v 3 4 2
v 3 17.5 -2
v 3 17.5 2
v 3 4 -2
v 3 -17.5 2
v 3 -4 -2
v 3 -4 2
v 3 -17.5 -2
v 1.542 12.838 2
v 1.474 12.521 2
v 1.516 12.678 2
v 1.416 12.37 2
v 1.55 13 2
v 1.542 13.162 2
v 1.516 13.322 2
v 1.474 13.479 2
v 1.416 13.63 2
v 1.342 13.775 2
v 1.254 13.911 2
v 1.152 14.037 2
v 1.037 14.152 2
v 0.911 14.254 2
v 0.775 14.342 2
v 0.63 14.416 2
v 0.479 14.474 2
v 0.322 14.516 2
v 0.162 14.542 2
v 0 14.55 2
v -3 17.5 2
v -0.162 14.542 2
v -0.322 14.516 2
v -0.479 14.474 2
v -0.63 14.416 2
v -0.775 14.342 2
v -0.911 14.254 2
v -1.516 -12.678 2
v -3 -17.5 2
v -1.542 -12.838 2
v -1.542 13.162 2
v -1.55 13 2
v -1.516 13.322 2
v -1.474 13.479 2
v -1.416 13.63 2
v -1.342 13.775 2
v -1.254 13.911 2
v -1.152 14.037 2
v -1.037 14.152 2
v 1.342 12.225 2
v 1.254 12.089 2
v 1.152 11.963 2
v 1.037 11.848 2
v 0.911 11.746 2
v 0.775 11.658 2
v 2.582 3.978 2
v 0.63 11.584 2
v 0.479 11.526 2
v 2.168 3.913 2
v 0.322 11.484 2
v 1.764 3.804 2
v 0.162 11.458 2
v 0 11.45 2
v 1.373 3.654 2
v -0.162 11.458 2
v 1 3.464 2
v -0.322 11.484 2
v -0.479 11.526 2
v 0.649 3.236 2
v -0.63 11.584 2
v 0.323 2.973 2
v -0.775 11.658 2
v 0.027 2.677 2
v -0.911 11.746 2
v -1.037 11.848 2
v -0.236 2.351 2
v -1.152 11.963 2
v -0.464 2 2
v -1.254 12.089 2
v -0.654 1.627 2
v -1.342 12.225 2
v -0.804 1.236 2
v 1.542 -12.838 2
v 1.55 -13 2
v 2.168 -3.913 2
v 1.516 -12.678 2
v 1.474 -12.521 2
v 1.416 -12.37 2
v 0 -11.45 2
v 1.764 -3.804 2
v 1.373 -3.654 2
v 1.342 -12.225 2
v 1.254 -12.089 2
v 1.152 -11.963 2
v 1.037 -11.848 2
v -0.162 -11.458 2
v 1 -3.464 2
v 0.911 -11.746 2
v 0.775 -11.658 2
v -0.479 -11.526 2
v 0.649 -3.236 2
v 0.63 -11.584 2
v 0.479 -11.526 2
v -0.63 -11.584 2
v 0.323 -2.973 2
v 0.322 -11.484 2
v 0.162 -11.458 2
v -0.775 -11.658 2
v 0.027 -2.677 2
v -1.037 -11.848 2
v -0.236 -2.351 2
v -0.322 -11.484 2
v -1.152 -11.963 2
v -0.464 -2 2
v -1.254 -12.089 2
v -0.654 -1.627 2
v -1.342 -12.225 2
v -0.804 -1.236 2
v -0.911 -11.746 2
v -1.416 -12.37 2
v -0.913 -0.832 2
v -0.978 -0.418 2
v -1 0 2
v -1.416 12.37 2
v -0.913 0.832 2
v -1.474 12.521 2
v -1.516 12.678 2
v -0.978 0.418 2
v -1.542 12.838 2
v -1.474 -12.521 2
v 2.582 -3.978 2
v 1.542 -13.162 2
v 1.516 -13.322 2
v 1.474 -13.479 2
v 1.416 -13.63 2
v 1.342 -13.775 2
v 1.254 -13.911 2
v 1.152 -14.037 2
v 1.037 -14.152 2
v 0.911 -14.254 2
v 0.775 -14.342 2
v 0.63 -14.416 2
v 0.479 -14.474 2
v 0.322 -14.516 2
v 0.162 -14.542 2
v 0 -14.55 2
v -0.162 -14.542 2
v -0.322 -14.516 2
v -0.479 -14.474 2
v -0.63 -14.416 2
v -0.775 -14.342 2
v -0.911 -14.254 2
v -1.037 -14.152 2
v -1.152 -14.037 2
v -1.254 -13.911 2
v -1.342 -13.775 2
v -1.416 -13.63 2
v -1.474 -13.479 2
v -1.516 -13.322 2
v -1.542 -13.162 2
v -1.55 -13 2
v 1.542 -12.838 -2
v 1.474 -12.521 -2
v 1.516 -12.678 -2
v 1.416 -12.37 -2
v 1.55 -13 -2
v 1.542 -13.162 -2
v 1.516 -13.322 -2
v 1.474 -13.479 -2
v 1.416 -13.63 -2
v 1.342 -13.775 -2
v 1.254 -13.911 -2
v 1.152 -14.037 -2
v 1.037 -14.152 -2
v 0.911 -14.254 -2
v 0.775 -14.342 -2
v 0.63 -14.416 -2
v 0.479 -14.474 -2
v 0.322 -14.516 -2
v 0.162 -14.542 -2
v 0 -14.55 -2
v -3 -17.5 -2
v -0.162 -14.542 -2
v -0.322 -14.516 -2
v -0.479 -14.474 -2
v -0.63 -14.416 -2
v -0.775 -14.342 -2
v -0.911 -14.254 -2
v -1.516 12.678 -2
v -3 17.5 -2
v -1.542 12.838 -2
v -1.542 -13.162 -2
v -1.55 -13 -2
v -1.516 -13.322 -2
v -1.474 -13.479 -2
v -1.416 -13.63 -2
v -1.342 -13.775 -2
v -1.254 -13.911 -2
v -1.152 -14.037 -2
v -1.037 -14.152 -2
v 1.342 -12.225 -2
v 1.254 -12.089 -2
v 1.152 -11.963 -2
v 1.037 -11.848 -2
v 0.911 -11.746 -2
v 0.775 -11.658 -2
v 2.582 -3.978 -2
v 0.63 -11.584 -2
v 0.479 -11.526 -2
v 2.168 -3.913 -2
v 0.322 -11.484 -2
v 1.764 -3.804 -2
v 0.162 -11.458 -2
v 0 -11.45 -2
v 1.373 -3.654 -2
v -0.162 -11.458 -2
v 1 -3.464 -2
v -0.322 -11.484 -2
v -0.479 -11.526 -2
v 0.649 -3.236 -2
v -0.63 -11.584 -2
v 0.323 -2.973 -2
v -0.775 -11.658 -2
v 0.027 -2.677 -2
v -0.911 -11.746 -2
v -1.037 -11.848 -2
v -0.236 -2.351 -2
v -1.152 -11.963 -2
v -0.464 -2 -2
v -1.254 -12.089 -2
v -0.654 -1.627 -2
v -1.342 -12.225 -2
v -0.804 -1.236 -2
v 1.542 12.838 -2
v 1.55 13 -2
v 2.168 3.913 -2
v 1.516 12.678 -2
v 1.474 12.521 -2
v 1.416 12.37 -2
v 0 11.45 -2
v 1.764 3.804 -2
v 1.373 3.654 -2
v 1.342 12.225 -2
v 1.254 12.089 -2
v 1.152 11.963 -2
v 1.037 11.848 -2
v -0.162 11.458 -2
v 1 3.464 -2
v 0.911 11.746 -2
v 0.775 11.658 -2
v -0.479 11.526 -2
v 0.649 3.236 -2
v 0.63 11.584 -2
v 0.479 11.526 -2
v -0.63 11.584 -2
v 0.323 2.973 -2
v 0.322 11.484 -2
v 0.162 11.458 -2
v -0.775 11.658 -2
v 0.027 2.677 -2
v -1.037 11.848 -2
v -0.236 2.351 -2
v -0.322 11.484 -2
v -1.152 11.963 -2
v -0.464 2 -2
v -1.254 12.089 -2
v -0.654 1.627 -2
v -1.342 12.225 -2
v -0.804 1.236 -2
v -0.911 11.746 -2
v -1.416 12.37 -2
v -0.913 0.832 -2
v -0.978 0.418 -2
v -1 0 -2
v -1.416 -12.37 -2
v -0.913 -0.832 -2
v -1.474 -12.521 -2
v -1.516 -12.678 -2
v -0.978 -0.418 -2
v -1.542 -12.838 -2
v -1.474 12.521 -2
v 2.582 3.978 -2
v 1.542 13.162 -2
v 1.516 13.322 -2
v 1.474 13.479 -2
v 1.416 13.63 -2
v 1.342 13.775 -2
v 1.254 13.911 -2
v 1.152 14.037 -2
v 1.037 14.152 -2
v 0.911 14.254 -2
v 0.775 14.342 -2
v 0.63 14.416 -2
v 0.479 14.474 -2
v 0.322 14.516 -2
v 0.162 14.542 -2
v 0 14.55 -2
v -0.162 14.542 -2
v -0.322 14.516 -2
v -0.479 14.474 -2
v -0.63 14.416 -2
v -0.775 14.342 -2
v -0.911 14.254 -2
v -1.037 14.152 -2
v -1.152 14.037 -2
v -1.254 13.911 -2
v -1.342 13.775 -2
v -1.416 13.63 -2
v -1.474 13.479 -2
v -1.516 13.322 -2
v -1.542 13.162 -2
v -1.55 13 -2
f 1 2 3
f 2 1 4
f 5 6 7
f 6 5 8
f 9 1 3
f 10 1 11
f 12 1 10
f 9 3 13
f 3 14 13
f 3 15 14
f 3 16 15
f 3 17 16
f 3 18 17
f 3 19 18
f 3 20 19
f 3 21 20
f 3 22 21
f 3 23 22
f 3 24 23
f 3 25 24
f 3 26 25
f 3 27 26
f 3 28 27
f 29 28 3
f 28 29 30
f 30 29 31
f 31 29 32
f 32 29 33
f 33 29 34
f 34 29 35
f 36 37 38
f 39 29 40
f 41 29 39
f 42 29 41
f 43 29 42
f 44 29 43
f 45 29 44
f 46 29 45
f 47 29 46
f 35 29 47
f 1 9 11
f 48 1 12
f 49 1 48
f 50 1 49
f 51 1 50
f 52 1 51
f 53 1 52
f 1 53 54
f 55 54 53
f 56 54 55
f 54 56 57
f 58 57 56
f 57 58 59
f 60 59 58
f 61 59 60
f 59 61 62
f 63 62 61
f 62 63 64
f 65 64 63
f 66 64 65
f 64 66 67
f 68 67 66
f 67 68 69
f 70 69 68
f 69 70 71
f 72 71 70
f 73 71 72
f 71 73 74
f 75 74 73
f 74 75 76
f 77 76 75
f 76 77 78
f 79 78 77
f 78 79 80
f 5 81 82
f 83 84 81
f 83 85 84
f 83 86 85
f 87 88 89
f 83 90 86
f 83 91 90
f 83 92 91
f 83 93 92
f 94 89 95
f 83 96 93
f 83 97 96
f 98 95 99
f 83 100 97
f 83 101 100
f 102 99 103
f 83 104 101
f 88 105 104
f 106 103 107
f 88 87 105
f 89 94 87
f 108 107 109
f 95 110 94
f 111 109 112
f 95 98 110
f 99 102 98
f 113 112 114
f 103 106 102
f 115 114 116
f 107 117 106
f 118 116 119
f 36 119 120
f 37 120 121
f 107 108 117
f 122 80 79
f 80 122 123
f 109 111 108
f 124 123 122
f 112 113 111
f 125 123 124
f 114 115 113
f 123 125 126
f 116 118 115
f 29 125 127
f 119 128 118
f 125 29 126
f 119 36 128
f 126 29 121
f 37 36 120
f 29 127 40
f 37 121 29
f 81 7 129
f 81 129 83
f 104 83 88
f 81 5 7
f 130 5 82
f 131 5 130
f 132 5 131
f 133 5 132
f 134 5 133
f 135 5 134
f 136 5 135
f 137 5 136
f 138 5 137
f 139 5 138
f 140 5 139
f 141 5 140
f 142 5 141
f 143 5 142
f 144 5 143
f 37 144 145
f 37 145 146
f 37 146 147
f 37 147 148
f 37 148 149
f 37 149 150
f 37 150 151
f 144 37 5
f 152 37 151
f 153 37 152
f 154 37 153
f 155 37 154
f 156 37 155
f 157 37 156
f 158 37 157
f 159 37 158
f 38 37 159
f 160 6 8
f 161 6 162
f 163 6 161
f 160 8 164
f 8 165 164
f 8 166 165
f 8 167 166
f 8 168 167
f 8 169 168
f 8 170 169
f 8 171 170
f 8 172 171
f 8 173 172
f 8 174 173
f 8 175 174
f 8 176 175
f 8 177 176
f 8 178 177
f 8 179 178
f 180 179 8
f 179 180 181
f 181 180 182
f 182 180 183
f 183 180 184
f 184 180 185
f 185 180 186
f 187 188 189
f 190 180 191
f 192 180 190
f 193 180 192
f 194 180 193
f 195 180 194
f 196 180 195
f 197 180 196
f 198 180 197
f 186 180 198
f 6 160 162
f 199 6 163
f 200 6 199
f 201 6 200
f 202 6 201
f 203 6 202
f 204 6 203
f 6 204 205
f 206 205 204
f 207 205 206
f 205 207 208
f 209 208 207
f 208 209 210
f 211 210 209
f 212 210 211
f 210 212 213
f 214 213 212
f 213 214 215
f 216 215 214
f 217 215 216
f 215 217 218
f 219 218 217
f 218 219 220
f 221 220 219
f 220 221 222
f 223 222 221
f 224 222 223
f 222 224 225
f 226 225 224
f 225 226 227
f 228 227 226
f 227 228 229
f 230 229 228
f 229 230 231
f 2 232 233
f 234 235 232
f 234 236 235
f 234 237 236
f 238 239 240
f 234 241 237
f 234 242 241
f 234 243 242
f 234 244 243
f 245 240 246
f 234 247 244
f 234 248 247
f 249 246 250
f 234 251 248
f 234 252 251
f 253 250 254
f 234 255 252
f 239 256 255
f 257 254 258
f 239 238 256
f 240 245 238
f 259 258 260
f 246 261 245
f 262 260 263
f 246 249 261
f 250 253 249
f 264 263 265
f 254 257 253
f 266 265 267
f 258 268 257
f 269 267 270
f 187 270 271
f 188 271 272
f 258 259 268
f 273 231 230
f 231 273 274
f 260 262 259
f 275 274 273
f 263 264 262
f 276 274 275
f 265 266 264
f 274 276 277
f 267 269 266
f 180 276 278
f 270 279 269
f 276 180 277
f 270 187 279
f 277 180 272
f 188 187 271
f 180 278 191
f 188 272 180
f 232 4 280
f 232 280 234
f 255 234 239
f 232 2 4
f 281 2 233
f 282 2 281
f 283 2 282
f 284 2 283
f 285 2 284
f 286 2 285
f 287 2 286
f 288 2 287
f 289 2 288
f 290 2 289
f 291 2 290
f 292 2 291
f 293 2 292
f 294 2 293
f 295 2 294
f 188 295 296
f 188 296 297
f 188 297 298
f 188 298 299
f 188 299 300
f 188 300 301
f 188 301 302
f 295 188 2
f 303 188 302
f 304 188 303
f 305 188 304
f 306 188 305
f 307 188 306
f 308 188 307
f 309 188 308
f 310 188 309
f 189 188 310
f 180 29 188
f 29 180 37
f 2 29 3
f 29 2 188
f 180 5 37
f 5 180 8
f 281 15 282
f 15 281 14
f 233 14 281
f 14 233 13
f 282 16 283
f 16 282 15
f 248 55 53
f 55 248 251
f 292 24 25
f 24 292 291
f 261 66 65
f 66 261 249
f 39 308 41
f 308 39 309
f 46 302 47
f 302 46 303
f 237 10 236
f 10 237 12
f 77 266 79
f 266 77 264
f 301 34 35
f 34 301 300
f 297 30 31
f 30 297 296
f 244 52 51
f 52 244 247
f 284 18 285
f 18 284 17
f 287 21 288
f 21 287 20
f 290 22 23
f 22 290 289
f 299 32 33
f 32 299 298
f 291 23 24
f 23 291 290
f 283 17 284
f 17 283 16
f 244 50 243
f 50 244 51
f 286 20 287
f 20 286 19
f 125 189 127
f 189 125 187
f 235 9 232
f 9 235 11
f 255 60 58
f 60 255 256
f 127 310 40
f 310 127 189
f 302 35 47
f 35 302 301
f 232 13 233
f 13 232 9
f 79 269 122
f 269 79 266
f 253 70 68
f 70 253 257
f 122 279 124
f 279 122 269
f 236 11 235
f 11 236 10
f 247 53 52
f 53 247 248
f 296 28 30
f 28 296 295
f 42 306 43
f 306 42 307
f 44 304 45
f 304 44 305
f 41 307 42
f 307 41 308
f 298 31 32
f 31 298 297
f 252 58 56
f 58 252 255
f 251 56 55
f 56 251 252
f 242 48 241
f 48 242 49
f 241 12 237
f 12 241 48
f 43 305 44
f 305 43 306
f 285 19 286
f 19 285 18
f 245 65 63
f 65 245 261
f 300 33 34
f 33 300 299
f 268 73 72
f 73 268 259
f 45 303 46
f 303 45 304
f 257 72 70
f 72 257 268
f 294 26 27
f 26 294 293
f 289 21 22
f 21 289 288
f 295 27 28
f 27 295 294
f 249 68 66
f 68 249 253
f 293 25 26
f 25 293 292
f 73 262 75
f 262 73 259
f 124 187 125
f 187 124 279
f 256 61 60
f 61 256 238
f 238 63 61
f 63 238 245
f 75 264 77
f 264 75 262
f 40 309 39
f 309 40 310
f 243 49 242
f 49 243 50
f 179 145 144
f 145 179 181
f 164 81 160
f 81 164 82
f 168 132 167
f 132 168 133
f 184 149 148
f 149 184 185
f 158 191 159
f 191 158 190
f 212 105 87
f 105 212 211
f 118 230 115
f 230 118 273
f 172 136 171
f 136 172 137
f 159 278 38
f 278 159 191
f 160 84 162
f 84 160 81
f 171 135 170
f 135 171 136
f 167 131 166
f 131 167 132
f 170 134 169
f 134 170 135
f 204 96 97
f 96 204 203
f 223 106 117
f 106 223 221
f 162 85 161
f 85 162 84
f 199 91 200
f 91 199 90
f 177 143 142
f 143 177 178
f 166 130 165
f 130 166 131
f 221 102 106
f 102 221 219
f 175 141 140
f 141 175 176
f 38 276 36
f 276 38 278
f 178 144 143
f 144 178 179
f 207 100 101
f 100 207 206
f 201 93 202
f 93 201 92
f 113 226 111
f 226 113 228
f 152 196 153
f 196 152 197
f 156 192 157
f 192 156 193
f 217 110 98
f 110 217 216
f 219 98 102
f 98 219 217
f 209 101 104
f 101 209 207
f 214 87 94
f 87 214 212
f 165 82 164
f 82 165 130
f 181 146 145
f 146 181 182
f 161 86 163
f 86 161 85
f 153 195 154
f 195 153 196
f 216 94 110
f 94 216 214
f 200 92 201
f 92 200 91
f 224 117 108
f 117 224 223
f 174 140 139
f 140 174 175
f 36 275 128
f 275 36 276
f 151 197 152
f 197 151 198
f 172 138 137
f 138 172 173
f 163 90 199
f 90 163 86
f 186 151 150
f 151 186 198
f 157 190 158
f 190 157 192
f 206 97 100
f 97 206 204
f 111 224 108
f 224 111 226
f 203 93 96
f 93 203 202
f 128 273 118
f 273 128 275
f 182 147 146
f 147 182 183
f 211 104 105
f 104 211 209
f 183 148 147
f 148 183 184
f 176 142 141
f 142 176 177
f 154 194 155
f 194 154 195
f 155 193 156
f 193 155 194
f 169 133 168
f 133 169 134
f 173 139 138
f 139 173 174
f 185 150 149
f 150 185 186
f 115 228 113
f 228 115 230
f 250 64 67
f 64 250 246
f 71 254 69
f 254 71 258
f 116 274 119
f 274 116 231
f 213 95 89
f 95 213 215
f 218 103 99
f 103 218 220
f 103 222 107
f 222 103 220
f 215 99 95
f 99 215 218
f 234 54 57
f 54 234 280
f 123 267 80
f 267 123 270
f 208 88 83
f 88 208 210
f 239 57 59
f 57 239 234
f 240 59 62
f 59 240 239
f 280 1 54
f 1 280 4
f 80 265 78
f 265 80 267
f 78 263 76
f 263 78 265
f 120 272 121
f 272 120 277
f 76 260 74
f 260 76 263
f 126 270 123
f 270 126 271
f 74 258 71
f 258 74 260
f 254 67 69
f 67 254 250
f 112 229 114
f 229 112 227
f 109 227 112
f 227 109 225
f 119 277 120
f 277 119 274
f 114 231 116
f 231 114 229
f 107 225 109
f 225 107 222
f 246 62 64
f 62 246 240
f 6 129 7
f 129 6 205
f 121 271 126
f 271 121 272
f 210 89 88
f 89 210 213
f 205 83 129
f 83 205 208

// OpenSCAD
// file: constants.scad
    /*Project constants*/
//width = ScrewHoleDist+(BaseDiam*2)+ WidthCompl
//
//Distance of the holes for mounting, affects the width(y-axis)
ScrewHoleDist = 31;

//Thickness of the plate
BaseThick = 8.0;

 
//Diameter of the hole in the middle on the stepper holder
MidHoleDiam = 23;

//Diameter of the screw hole
ScrewHoleDiam = 3.1;
    
//Diameter of the corner cylinders,affects the width of the body(y-axis)
BaseDiam = 3;

//Body width complement (y-axis)
WidthCompl = 10;
//Body length complement (x-axis)
LengthCompl = 10;

//Body length complement for the upper part (x-axis)
LengthDiffUp = 5;

//Body length complement for the moving part (x)
LengthDiffDown = 5;

W = ScrewHoleDist+(BaseDiam*2)+WidthCompl;
L = ScrewHoleDist+(BaseDiam*2)+LengthCompl;



//Diameter of the smooth rods
RodDiam = 5;

SmoothRodDistFromCenter = 16.5; // 31/2;

//diameter of the bearing
BearingDiam = RodDiam+6;

BearingHeight = 20 + 2;

//Diameter of the threaded rod  
ThreadedRodDiam = 10.3;

//Diameter of the hole for the threaded rod
ThreadedRodHoleDiam = 10.8;

NutDiam = 22.0;
NutHeight =20;
NutWall=2;
NutHoleDiam = NutDiam-2*NutWall;


//size and height of the linear motion nut
ThreadedNutSize = 10.25;
ThreadedNutHeight = 4.95;

//size and height of the syringe tightening nut
SyrNutSize = 5.6; //5.41
SyrNutHeight = 2.4; //2.32

//Height of the syringe mounting body
BodyHeight = 190;

//Syringe mounting
SyrMountDownHeight = 110;

//Syringe radius for the mounting
SyrDiamDown =8;

SyrDiamUp = 4.6;

//Dimensions of the syringe fastening plate
PlateX=6;
PlateY=35;
PlateHolesYPos=13;

//Safety Button
ButtonX = 7;
ButtonY = 6.4;
ButtonThick = 3.4;
ButtonXPos = -15;

//Board screw holes
BoardScrewHolePosX = -23;
BoardScrewHolePosY = 11;
BoardScrewLength = 20;
BoardScrewHoleDiam= 2.5;


//Display board
DisplayX = 12;
DisplayY = 38.3;
// main file
include<constants.scad>

//tightPlate();
tight_plate(PlateX,PlateY,BaseThick/2,PlateHolesYPos,ScrewHoleDiam/2,SyrDiamDown/2);

module tight_plate(x,y,z,holeY,holeD,syrD){
    difference(){
    cube([x,y,z],true);
    
    translate([0,holeY,0])cylinder(z*2,holeD,holeD,$fn=60,true);
    translate([0,-holeY,0])cylinder(z*2,holeD,holeD,$fn=60,true);
    translate([x/2,0,0])cylinder(z*2,syrD,syrD,$fn=60,true);
    }
}
